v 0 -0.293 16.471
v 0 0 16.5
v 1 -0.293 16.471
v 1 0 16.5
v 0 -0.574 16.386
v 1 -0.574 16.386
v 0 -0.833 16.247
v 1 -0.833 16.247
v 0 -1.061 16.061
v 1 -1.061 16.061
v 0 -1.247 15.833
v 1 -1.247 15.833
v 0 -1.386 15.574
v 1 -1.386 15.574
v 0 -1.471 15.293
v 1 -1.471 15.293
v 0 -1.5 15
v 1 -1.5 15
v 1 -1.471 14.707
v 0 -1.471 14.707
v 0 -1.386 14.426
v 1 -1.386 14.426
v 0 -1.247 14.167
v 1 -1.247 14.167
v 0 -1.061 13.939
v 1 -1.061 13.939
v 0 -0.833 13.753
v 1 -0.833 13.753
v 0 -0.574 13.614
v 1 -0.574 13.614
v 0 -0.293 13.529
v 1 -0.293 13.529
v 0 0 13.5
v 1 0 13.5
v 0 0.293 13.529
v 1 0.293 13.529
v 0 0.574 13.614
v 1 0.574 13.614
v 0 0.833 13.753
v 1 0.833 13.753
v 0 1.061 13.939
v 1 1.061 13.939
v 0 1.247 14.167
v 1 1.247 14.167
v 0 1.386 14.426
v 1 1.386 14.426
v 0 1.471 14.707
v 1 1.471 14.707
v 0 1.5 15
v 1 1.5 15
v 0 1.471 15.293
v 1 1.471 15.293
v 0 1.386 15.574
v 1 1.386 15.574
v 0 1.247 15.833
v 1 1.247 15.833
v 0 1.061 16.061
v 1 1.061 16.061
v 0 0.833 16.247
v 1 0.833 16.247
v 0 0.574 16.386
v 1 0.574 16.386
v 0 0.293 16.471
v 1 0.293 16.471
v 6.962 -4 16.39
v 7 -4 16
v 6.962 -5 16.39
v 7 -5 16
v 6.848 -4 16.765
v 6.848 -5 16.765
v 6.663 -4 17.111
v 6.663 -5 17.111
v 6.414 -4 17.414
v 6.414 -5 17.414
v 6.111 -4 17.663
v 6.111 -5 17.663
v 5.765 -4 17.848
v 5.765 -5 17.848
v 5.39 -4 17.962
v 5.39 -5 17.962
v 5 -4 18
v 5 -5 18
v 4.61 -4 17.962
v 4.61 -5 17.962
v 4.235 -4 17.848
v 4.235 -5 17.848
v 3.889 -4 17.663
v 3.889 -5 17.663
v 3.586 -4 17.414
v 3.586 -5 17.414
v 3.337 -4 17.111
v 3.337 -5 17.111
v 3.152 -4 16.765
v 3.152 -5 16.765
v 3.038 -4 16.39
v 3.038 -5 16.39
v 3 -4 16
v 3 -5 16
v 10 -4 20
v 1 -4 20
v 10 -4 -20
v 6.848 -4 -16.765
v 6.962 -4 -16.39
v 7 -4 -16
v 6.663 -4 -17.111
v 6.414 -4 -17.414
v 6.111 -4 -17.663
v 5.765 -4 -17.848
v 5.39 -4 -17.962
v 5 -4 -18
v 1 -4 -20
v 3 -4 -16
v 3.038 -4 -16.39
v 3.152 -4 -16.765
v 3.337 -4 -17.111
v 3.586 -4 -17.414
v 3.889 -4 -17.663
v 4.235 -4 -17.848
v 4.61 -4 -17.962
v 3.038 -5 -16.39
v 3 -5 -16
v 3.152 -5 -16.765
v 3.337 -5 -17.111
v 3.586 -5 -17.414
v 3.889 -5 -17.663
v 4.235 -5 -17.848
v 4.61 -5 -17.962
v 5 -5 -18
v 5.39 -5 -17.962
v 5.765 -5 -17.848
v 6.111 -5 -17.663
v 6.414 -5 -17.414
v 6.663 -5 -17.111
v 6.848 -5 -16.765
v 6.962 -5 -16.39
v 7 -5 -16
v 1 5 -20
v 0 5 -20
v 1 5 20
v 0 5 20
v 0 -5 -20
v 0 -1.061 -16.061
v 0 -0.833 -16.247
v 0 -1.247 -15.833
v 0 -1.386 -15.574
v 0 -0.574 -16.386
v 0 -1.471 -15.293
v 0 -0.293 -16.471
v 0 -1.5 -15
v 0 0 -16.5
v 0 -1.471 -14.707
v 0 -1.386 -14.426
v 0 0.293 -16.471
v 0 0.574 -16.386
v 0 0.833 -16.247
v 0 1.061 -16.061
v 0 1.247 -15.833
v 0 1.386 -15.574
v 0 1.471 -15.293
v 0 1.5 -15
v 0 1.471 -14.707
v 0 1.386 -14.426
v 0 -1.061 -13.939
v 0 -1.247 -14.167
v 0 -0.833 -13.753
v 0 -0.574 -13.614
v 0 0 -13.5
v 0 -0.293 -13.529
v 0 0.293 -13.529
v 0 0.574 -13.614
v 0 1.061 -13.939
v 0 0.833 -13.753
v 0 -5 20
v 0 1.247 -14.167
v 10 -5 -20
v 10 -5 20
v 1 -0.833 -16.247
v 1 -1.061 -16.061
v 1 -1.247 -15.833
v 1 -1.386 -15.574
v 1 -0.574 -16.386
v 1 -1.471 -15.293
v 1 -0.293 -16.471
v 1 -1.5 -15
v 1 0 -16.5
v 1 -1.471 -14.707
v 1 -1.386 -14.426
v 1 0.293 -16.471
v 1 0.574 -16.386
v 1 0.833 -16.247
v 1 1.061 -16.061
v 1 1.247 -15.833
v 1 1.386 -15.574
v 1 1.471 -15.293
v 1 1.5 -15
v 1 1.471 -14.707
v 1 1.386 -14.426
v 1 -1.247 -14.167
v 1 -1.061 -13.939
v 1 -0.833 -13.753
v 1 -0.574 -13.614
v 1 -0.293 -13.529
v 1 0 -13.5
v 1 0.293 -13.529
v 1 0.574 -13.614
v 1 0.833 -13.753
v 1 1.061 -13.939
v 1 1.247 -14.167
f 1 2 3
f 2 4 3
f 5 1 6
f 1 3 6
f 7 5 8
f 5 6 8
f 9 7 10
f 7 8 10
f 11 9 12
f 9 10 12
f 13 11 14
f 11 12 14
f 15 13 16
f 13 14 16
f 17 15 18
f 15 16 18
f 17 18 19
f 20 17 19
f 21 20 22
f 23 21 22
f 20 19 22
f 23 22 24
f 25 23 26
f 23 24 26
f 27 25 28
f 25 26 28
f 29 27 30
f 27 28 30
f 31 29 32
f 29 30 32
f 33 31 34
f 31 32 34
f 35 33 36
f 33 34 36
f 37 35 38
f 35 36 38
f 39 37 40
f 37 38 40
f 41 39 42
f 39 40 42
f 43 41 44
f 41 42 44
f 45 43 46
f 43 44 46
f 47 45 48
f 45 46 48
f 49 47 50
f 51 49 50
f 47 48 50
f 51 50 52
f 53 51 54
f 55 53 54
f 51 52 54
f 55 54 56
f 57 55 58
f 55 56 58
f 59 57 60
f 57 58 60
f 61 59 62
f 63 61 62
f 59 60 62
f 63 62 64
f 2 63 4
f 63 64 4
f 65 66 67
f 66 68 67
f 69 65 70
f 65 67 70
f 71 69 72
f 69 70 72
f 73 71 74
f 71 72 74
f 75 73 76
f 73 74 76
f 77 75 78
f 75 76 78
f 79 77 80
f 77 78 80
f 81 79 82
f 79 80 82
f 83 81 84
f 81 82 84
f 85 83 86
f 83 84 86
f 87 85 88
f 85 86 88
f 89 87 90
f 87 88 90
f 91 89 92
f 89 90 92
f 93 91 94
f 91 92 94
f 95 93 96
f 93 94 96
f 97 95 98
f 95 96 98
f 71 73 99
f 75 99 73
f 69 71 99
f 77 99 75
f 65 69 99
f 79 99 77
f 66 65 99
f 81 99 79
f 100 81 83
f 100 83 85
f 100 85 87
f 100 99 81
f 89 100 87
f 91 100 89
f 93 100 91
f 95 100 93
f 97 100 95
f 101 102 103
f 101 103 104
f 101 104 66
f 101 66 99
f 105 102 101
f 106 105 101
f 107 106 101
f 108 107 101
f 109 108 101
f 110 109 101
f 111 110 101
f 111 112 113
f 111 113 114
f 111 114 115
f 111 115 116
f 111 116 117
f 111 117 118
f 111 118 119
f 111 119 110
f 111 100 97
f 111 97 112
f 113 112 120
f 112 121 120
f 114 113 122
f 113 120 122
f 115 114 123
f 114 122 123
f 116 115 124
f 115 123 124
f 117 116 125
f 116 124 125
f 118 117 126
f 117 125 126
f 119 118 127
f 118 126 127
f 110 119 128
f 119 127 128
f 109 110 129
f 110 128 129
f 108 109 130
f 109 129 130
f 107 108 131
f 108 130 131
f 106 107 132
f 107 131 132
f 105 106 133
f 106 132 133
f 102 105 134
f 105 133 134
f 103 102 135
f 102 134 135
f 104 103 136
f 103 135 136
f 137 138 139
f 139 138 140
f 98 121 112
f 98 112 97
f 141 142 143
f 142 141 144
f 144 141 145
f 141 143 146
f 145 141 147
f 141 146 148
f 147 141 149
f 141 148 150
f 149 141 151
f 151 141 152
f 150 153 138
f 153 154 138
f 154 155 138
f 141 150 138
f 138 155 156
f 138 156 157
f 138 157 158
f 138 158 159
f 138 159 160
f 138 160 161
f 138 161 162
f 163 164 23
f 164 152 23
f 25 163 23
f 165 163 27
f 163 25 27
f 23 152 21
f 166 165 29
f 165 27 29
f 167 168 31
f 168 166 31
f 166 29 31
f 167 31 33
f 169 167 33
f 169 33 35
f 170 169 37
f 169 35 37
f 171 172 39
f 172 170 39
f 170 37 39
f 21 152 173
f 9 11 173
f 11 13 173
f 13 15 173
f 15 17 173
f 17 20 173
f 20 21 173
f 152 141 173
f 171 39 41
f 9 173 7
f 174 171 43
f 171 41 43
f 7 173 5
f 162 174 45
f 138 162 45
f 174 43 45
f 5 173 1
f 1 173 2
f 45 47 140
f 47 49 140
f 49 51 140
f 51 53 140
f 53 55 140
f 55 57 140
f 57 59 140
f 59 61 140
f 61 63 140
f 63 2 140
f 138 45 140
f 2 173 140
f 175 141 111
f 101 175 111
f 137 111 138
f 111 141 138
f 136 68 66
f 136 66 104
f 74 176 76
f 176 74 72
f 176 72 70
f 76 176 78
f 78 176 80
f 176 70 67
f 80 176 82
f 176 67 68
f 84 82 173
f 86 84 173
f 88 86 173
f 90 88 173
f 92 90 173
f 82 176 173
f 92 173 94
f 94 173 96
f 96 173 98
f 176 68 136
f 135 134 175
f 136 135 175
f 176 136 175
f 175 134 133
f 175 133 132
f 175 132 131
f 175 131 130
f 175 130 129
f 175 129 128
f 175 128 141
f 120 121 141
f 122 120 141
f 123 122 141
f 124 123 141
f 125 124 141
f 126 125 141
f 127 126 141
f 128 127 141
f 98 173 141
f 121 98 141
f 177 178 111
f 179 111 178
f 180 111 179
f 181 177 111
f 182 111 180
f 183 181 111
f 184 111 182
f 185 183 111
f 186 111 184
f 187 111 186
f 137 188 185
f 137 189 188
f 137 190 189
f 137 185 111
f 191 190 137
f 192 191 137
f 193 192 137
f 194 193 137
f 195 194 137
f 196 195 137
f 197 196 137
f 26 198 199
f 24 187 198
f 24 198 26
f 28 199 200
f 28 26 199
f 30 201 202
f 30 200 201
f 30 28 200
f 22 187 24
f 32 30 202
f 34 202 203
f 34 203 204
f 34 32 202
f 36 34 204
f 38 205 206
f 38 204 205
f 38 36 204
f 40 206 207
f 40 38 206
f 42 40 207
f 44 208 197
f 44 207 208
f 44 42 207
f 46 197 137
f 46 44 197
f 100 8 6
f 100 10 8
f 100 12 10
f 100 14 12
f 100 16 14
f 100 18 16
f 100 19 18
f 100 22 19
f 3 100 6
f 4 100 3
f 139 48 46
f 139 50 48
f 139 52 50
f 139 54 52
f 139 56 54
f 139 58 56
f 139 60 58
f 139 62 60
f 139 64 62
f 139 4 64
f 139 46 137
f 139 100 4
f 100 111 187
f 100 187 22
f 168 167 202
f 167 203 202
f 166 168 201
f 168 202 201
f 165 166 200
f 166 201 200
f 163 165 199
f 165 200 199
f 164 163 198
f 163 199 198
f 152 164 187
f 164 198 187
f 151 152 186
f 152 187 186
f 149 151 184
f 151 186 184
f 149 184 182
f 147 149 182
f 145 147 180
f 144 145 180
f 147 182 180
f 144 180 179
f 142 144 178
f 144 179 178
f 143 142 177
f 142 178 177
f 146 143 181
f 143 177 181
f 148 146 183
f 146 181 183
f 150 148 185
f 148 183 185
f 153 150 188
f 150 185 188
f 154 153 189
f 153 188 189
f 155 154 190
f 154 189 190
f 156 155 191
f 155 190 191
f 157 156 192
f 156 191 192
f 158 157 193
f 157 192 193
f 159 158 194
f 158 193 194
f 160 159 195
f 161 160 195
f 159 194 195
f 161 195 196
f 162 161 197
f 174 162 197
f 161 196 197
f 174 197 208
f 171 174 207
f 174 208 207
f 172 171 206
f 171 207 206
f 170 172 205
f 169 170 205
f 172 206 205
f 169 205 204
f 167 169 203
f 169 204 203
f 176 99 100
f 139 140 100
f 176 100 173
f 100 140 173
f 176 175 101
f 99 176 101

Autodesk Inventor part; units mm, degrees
ref_plane "YZ Plane" through (0, 0, 0) normal (1, 0, 0) x (0, 1, 0)
ref_plane "XZ Plane" through (0, 0, 0) normal (0, 1, 0) x (-1, 0, 0)
ref_plane "XY Plane" through (0, 0, 0) normal (0, 0, 1) x (1, 0, 0)
sketch "スケッチ1" plane through (0, 0, 0) normal (1, 0, 0) x (0, 1, 0)
  line L0 (-5, -20) -> (5, -20)
  line L1 (5, -20) -> (5, 20)
  line L2 (5, 20) -> (-5, 20)
  line L3 (-5, 20) -> (-5, -20)
  line L4 (-5, -20) -> (5, 20) construction
  line L5 (5, -20) -> (-5, 20) construction
  point P0 (0, 0)
  dimension "d0" = 10
  dimension "d1" = 40
extrude "押し出し1" add sketch "スケッチ1" along normal blind 10
shell "シェル1" thickness 1 removed faces 4 at (3.3333, 1.6667, 20) at (3.3333, 5, -6.6667) at (3.3333, -1.6667, -20) at (10, -1.6667, 6.6667)
sketch "スケッチ2" plane through (0, 0, 0) normal (-1, 0, 0) x (0, 0, 1)
  line L0 (-20, -5) -> (-20, 5)
  line L1 (20, 5) -> (20, -4.2502)
  line L2 (-20, 5) -> (20, 5) projected
  point P0 (0, 0)
  point P1 (-15, 0)
  point P2 (15, 0)
  dimension "d5" = 5
  dimension "d6" = 5
  dimension "d14" = 5
hole "穴1" at (0, 0, -15) at (0, 0, 15) direction (1, 0, 0) diameter 3 end through all
sketch "スケッチ3" plane through (0, -5, -20) normal (0, -1, 0) x (1, 0, 0)
  line L0 (3, 4) -> (3, 36)
  arc A0 (7, 36) -> (3, 36) centre (5, 36) ccw
  line L1 (7, 36) -> (7, 4)
  arc A1 (3, 4) -> (7, 4) centre (5, 4) ccw
  line L2 (0, 0) -> (10, 0) projected
  line L3 (10, 40) -> (10, 0) projected
  line L4 (0, 40) -> (10, 40) projected
  point P0 (0, 20)
  dimension "d15" = 2
  dimension "d16" = 4
  dimension "d17" = 5
  dimension "d18" = 4
extrude "押し出し2" cut sketch "スケッチ3" against normal blind 1
properties part number "palmrest_L_small" material "アルミニウム 6061"
